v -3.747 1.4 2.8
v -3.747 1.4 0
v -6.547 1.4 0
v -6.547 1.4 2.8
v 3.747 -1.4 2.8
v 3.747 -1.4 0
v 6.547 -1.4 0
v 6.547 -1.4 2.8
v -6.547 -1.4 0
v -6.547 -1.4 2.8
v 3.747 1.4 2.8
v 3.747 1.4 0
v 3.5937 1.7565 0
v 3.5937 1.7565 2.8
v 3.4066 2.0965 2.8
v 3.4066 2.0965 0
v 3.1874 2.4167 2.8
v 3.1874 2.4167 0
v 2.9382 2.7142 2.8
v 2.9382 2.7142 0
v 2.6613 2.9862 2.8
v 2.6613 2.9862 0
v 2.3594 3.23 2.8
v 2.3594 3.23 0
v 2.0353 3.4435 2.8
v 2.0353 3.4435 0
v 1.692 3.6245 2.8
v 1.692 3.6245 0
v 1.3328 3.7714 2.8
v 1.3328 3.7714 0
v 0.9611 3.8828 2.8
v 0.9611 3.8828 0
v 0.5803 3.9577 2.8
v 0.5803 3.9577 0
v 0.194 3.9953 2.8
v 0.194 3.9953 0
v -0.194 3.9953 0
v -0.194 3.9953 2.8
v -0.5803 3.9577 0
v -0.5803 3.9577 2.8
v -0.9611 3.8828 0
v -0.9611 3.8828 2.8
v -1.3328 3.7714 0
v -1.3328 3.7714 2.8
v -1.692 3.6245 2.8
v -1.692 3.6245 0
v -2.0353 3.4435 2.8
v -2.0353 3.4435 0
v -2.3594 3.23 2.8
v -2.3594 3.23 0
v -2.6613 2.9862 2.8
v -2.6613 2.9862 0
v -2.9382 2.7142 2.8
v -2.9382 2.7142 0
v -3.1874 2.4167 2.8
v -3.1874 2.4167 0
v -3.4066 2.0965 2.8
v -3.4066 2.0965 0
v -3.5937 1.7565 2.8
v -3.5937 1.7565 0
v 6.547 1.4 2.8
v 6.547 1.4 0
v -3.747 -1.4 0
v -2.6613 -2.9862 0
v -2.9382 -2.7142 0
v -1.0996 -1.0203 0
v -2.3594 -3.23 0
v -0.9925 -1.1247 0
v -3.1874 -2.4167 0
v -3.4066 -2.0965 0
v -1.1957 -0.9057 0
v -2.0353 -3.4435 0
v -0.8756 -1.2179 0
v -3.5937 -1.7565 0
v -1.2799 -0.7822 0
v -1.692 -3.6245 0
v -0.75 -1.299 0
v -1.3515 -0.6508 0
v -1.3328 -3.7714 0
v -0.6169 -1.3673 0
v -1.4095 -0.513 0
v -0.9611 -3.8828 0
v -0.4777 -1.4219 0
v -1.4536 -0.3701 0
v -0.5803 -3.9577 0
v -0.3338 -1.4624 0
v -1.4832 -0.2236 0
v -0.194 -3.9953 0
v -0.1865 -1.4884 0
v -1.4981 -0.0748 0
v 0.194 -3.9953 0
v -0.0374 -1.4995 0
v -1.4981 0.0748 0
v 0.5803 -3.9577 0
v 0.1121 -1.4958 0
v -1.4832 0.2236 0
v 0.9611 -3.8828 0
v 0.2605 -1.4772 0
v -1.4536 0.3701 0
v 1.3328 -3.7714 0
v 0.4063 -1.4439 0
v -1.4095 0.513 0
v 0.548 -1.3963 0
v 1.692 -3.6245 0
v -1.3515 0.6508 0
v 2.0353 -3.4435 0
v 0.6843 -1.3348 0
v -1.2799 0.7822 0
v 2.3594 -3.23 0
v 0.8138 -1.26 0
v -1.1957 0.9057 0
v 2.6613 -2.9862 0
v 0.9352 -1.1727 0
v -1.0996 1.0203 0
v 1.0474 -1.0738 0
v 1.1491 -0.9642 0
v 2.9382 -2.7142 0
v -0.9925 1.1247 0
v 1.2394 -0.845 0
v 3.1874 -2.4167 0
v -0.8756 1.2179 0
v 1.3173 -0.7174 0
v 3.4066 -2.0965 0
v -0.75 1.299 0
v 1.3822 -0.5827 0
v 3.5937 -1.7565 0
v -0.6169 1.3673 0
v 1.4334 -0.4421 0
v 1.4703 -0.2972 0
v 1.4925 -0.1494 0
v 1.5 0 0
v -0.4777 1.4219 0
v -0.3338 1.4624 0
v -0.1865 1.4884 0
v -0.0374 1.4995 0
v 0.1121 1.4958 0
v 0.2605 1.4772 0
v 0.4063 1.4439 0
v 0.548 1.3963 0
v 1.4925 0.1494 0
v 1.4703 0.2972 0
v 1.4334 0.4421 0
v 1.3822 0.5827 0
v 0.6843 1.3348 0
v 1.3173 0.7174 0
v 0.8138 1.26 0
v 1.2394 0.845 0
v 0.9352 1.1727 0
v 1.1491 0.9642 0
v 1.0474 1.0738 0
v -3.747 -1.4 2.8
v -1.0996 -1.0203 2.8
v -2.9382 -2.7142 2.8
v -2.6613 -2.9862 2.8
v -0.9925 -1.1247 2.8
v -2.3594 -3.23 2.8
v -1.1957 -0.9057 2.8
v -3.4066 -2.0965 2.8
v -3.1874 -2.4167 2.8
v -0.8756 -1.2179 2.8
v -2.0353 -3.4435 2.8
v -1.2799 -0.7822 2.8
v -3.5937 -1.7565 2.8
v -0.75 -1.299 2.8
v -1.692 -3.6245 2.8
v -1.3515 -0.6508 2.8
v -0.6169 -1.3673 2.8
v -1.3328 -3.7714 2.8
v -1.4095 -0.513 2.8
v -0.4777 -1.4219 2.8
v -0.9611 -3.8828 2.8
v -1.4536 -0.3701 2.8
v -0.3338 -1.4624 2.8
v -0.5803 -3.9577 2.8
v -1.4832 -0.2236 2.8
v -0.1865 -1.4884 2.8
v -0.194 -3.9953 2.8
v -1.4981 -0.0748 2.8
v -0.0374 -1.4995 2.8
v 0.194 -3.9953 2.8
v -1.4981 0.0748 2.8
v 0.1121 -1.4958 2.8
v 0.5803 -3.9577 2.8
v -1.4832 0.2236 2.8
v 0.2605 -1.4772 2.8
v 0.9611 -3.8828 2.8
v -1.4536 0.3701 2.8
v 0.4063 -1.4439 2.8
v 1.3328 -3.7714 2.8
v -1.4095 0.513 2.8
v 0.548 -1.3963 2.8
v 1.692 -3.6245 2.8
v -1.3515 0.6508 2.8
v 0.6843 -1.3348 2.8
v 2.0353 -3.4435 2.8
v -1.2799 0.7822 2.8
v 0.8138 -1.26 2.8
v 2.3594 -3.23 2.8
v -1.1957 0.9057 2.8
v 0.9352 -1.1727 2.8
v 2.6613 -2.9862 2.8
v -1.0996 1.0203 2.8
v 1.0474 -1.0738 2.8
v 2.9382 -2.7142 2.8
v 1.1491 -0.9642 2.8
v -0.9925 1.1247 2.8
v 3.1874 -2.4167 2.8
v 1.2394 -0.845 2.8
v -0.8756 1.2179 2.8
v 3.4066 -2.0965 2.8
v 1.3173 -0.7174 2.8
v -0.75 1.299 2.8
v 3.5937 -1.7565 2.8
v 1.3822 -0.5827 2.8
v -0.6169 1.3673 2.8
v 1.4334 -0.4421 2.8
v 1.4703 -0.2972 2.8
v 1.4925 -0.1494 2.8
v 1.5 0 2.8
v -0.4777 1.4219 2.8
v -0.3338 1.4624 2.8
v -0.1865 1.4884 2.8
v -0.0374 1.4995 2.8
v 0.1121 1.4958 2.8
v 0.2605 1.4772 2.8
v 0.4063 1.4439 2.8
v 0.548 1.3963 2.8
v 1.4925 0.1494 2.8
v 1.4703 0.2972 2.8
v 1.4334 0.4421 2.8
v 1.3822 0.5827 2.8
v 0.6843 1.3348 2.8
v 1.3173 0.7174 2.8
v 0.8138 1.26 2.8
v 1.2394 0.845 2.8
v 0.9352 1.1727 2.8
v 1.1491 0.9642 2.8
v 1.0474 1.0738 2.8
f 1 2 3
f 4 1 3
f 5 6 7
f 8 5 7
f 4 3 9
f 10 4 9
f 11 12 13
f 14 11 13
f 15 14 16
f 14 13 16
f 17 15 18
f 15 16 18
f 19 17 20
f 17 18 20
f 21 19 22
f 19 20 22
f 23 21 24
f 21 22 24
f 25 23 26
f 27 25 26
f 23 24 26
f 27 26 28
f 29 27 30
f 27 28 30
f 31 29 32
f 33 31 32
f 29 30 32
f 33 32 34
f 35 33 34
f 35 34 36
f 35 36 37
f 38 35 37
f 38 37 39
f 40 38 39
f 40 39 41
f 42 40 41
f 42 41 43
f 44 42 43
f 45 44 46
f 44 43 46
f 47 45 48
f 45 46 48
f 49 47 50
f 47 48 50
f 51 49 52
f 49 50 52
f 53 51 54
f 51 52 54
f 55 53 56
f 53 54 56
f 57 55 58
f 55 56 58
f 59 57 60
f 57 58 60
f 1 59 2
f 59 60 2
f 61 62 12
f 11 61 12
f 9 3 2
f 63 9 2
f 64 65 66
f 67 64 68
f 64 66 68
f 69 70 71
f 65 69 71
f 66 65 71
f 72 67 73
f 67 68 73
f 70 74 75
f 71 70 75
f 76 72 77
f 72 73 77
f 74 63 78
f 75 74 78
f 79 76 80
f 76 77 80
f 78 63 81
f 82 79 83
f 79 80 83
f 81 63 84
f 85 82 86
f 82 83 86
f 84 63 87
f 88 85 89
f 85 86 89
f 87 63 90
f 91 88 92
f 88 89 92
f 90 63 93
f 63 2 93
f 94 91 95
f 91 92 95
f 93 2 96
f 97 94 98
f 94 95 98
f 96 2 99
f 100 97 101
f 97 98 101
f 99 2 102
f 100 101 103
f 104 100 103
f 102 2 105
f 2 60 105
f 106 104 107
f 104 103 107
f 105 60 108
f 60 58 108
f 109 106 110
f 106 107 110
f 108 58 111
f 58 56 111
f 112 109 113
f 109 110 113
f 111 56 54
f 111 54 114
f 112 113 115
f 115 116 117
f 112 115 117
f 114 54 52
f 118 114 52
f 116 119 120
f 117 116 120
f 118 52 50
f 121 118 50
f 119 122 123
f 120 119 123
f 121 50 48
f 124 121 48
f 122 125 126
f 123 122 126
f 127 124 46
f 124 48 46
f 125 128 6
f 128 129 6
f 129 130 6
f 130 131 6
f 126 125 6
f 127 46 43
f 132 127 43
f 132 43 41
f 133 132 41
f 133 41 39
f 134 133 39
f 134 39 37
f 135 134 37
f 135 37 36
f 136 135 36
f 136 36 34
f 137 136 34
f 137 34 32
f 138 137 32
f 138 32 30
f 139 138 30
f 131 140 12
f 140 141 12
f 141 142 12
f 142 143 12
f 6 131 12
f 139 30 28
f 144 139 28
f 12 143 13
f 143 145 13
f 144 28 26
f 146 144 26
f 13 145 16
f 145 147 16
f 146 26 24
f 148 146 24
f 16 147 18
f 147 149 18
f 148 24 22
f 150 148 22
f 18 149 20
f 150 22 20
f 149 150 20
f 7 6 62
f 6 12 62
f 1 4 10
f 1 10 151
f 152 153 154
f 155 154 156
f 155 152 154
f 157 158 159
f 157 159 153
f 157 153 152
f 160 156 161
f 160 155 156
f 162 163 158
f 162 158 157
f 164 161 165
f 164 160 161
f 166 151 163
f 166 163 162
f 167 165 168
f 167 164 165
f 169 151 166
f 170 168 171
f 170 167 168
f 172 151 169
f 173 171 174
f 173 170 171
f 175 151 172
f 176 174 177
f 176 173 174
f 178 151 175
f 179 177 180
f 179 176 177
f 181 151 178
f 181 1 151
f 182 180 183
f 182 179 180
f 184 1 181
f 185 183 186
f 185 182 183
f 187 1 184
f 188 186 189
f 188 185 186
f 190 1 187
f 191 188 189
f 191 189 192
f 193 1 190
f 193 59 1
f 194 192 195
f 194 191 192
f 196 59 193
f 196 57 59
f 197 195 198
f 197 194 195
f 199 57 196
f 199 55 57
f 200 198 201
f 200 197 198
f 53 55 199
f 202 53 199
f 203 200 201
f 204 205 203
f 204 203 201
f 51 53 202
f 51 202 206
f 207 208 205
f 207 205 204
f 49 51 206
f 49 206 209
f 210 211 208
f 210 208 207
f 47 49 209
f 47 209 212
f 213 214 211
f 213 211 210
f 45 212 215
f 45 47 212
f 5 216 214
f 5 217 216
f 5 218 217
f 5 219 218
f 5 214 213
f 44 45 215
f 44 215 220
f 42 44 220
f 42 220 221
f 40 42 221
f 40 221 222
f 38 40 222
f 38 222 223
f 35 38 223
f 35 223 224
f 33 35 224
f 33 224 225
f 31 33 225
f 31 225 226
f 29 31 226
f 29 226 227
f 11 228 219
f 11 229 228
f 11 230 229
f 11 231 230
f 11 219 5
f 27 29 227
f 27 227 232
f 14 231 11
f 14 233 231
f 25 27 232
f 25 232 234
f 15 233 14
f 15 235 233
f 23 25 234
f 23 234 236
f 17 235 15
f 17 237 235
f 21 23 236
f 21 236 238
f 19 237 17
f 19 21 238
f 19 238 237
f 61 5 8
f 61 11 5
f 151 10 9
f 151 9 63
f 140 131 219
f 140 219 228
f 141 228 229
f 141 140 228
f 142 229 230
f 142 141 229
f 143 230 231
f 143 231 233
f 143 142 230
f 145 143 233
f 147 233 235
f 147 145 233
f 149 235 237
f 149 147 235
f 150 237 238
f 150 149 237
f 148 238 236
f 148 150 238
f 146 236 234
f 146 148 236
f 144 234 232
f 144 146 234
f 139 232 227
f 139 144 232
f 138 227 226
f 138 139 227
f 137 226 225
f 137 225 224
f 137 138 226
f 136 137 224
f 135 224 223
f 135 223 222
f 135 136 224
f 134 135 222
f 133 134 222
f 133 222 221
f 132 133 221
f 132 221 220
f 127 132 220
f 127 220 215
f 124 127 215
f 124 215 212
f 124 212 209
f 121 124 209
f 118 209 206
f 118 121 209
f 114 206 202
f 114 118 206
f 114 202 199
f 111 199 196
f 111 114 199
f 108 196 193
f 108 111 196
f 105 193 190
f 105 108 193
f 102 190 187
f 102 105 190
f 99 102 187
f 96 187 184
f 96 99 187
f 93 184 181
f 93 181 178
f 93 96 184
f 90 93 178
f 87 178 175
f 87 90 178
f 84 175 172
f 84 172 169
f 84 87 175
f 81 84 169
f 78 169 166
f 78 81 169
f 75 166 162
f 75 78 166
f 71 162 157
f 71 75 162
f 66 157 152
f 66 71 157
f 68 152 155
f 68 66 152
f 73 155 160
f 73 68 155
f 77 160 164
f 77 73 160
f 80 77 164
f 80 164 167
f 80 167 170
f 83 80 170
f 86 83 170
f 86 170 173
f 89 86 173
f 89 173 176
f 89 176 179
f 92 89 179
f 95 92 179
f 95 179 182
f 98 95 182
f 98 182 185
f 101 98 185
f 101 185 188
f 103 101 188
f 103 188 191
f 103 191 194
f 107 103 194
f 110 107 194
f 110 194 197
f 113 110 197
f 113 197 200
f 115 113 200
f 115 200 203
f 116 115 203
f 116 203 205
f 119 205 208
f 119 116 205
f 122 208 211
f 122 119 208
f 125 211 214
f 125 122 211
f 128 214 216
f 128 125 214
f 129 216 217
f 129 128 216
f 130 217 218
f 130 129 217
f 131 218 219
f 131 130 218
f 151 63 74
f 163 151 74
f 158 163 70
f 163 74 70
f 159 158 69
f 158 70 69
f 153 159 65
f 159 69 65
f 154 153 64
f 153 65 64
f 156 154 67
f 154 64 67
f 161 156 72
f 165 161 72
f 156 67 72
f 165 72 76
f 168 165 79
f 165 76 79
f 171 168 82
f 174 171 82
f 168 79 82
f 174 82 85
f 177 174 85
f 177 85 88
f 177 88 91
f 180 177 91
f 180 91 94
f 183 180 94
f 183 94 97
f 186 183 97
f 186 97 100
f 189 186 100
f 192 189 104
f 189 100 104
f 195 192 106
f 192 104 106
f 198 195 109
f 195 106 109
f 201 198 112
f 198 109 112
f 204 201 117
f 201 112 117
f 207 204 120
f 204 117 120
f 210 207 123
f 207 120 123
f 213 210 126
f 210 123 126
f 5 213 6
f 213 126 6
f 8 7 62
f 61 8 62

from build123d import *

# Parameters (mm, degrees)
F0_R     = 1.5
F1_DEPTH = 2.8


with BuildPart() as f1:
    # F0 (on Top) → F1 (new body)
    with BuildSketch(Plane.XY):
        with BuildLine():
            ThreePointArc((-3.746999, -1.4), (-4, 0), (-3.746999, 1.4))
            Line((-3.746999, 1.4), (-6.546999, 1.4))
            Line((-6.546999, 1.4), (-6.546999, -1.4))
            Line((-6.546999, -1.4), (-3.746999, -1.4))
        make_face()
        with BuildLine():
            Line((3.746999, -1.4), (3.746999, 1.4))
            ThreePointArc((3.746999, 1.4), (0, 4), (-3.746999, 1.4))
            Line((-3.746999, 1.4), (-3.746999, -1.4))
            ThreePointArc((-3.746999, -1.4), (0, -4), (3.746999, -1.4))
        make_face()
        Circle(F0_R, mode=Mode.SUBTRACT)
        with BuildLine():
            Line((-3.746999, -1.4), (-3.746999, 1.4))
            ThreePointArc((-3.746999, 1.4), (-4, 0), (-3.746999, -1.4))
        make_face()
        with BuildLine():
            ThreePointArc((3.746999, 1.4), (3.936242, 0.711338), (4, 0))
            ThreePointArc((4, 0), (3.936242, -0.711338), (3.746999, -1.4))
            Line((3.746999, -1.4), (6.546999, -1.4))
            Line((6.546999, -1.4), (6.546999, 1.4))
            Line((6.546999, 1.4), (3.746999, 1.4))
        make_face()
        with BuildLine():
            ThreePointArc((3.746999, -1.4), (3.936242, -0.711338), (4, 0))
            ThreePointArc((4, 0), (3.936242, 0.711338), (3.746999, 1.4))
            Line((3.746999, 1.4), (3.746999, -1.4))
        make_face()
    extrude(amount=F1_DEPTH)


solid = f1.part
